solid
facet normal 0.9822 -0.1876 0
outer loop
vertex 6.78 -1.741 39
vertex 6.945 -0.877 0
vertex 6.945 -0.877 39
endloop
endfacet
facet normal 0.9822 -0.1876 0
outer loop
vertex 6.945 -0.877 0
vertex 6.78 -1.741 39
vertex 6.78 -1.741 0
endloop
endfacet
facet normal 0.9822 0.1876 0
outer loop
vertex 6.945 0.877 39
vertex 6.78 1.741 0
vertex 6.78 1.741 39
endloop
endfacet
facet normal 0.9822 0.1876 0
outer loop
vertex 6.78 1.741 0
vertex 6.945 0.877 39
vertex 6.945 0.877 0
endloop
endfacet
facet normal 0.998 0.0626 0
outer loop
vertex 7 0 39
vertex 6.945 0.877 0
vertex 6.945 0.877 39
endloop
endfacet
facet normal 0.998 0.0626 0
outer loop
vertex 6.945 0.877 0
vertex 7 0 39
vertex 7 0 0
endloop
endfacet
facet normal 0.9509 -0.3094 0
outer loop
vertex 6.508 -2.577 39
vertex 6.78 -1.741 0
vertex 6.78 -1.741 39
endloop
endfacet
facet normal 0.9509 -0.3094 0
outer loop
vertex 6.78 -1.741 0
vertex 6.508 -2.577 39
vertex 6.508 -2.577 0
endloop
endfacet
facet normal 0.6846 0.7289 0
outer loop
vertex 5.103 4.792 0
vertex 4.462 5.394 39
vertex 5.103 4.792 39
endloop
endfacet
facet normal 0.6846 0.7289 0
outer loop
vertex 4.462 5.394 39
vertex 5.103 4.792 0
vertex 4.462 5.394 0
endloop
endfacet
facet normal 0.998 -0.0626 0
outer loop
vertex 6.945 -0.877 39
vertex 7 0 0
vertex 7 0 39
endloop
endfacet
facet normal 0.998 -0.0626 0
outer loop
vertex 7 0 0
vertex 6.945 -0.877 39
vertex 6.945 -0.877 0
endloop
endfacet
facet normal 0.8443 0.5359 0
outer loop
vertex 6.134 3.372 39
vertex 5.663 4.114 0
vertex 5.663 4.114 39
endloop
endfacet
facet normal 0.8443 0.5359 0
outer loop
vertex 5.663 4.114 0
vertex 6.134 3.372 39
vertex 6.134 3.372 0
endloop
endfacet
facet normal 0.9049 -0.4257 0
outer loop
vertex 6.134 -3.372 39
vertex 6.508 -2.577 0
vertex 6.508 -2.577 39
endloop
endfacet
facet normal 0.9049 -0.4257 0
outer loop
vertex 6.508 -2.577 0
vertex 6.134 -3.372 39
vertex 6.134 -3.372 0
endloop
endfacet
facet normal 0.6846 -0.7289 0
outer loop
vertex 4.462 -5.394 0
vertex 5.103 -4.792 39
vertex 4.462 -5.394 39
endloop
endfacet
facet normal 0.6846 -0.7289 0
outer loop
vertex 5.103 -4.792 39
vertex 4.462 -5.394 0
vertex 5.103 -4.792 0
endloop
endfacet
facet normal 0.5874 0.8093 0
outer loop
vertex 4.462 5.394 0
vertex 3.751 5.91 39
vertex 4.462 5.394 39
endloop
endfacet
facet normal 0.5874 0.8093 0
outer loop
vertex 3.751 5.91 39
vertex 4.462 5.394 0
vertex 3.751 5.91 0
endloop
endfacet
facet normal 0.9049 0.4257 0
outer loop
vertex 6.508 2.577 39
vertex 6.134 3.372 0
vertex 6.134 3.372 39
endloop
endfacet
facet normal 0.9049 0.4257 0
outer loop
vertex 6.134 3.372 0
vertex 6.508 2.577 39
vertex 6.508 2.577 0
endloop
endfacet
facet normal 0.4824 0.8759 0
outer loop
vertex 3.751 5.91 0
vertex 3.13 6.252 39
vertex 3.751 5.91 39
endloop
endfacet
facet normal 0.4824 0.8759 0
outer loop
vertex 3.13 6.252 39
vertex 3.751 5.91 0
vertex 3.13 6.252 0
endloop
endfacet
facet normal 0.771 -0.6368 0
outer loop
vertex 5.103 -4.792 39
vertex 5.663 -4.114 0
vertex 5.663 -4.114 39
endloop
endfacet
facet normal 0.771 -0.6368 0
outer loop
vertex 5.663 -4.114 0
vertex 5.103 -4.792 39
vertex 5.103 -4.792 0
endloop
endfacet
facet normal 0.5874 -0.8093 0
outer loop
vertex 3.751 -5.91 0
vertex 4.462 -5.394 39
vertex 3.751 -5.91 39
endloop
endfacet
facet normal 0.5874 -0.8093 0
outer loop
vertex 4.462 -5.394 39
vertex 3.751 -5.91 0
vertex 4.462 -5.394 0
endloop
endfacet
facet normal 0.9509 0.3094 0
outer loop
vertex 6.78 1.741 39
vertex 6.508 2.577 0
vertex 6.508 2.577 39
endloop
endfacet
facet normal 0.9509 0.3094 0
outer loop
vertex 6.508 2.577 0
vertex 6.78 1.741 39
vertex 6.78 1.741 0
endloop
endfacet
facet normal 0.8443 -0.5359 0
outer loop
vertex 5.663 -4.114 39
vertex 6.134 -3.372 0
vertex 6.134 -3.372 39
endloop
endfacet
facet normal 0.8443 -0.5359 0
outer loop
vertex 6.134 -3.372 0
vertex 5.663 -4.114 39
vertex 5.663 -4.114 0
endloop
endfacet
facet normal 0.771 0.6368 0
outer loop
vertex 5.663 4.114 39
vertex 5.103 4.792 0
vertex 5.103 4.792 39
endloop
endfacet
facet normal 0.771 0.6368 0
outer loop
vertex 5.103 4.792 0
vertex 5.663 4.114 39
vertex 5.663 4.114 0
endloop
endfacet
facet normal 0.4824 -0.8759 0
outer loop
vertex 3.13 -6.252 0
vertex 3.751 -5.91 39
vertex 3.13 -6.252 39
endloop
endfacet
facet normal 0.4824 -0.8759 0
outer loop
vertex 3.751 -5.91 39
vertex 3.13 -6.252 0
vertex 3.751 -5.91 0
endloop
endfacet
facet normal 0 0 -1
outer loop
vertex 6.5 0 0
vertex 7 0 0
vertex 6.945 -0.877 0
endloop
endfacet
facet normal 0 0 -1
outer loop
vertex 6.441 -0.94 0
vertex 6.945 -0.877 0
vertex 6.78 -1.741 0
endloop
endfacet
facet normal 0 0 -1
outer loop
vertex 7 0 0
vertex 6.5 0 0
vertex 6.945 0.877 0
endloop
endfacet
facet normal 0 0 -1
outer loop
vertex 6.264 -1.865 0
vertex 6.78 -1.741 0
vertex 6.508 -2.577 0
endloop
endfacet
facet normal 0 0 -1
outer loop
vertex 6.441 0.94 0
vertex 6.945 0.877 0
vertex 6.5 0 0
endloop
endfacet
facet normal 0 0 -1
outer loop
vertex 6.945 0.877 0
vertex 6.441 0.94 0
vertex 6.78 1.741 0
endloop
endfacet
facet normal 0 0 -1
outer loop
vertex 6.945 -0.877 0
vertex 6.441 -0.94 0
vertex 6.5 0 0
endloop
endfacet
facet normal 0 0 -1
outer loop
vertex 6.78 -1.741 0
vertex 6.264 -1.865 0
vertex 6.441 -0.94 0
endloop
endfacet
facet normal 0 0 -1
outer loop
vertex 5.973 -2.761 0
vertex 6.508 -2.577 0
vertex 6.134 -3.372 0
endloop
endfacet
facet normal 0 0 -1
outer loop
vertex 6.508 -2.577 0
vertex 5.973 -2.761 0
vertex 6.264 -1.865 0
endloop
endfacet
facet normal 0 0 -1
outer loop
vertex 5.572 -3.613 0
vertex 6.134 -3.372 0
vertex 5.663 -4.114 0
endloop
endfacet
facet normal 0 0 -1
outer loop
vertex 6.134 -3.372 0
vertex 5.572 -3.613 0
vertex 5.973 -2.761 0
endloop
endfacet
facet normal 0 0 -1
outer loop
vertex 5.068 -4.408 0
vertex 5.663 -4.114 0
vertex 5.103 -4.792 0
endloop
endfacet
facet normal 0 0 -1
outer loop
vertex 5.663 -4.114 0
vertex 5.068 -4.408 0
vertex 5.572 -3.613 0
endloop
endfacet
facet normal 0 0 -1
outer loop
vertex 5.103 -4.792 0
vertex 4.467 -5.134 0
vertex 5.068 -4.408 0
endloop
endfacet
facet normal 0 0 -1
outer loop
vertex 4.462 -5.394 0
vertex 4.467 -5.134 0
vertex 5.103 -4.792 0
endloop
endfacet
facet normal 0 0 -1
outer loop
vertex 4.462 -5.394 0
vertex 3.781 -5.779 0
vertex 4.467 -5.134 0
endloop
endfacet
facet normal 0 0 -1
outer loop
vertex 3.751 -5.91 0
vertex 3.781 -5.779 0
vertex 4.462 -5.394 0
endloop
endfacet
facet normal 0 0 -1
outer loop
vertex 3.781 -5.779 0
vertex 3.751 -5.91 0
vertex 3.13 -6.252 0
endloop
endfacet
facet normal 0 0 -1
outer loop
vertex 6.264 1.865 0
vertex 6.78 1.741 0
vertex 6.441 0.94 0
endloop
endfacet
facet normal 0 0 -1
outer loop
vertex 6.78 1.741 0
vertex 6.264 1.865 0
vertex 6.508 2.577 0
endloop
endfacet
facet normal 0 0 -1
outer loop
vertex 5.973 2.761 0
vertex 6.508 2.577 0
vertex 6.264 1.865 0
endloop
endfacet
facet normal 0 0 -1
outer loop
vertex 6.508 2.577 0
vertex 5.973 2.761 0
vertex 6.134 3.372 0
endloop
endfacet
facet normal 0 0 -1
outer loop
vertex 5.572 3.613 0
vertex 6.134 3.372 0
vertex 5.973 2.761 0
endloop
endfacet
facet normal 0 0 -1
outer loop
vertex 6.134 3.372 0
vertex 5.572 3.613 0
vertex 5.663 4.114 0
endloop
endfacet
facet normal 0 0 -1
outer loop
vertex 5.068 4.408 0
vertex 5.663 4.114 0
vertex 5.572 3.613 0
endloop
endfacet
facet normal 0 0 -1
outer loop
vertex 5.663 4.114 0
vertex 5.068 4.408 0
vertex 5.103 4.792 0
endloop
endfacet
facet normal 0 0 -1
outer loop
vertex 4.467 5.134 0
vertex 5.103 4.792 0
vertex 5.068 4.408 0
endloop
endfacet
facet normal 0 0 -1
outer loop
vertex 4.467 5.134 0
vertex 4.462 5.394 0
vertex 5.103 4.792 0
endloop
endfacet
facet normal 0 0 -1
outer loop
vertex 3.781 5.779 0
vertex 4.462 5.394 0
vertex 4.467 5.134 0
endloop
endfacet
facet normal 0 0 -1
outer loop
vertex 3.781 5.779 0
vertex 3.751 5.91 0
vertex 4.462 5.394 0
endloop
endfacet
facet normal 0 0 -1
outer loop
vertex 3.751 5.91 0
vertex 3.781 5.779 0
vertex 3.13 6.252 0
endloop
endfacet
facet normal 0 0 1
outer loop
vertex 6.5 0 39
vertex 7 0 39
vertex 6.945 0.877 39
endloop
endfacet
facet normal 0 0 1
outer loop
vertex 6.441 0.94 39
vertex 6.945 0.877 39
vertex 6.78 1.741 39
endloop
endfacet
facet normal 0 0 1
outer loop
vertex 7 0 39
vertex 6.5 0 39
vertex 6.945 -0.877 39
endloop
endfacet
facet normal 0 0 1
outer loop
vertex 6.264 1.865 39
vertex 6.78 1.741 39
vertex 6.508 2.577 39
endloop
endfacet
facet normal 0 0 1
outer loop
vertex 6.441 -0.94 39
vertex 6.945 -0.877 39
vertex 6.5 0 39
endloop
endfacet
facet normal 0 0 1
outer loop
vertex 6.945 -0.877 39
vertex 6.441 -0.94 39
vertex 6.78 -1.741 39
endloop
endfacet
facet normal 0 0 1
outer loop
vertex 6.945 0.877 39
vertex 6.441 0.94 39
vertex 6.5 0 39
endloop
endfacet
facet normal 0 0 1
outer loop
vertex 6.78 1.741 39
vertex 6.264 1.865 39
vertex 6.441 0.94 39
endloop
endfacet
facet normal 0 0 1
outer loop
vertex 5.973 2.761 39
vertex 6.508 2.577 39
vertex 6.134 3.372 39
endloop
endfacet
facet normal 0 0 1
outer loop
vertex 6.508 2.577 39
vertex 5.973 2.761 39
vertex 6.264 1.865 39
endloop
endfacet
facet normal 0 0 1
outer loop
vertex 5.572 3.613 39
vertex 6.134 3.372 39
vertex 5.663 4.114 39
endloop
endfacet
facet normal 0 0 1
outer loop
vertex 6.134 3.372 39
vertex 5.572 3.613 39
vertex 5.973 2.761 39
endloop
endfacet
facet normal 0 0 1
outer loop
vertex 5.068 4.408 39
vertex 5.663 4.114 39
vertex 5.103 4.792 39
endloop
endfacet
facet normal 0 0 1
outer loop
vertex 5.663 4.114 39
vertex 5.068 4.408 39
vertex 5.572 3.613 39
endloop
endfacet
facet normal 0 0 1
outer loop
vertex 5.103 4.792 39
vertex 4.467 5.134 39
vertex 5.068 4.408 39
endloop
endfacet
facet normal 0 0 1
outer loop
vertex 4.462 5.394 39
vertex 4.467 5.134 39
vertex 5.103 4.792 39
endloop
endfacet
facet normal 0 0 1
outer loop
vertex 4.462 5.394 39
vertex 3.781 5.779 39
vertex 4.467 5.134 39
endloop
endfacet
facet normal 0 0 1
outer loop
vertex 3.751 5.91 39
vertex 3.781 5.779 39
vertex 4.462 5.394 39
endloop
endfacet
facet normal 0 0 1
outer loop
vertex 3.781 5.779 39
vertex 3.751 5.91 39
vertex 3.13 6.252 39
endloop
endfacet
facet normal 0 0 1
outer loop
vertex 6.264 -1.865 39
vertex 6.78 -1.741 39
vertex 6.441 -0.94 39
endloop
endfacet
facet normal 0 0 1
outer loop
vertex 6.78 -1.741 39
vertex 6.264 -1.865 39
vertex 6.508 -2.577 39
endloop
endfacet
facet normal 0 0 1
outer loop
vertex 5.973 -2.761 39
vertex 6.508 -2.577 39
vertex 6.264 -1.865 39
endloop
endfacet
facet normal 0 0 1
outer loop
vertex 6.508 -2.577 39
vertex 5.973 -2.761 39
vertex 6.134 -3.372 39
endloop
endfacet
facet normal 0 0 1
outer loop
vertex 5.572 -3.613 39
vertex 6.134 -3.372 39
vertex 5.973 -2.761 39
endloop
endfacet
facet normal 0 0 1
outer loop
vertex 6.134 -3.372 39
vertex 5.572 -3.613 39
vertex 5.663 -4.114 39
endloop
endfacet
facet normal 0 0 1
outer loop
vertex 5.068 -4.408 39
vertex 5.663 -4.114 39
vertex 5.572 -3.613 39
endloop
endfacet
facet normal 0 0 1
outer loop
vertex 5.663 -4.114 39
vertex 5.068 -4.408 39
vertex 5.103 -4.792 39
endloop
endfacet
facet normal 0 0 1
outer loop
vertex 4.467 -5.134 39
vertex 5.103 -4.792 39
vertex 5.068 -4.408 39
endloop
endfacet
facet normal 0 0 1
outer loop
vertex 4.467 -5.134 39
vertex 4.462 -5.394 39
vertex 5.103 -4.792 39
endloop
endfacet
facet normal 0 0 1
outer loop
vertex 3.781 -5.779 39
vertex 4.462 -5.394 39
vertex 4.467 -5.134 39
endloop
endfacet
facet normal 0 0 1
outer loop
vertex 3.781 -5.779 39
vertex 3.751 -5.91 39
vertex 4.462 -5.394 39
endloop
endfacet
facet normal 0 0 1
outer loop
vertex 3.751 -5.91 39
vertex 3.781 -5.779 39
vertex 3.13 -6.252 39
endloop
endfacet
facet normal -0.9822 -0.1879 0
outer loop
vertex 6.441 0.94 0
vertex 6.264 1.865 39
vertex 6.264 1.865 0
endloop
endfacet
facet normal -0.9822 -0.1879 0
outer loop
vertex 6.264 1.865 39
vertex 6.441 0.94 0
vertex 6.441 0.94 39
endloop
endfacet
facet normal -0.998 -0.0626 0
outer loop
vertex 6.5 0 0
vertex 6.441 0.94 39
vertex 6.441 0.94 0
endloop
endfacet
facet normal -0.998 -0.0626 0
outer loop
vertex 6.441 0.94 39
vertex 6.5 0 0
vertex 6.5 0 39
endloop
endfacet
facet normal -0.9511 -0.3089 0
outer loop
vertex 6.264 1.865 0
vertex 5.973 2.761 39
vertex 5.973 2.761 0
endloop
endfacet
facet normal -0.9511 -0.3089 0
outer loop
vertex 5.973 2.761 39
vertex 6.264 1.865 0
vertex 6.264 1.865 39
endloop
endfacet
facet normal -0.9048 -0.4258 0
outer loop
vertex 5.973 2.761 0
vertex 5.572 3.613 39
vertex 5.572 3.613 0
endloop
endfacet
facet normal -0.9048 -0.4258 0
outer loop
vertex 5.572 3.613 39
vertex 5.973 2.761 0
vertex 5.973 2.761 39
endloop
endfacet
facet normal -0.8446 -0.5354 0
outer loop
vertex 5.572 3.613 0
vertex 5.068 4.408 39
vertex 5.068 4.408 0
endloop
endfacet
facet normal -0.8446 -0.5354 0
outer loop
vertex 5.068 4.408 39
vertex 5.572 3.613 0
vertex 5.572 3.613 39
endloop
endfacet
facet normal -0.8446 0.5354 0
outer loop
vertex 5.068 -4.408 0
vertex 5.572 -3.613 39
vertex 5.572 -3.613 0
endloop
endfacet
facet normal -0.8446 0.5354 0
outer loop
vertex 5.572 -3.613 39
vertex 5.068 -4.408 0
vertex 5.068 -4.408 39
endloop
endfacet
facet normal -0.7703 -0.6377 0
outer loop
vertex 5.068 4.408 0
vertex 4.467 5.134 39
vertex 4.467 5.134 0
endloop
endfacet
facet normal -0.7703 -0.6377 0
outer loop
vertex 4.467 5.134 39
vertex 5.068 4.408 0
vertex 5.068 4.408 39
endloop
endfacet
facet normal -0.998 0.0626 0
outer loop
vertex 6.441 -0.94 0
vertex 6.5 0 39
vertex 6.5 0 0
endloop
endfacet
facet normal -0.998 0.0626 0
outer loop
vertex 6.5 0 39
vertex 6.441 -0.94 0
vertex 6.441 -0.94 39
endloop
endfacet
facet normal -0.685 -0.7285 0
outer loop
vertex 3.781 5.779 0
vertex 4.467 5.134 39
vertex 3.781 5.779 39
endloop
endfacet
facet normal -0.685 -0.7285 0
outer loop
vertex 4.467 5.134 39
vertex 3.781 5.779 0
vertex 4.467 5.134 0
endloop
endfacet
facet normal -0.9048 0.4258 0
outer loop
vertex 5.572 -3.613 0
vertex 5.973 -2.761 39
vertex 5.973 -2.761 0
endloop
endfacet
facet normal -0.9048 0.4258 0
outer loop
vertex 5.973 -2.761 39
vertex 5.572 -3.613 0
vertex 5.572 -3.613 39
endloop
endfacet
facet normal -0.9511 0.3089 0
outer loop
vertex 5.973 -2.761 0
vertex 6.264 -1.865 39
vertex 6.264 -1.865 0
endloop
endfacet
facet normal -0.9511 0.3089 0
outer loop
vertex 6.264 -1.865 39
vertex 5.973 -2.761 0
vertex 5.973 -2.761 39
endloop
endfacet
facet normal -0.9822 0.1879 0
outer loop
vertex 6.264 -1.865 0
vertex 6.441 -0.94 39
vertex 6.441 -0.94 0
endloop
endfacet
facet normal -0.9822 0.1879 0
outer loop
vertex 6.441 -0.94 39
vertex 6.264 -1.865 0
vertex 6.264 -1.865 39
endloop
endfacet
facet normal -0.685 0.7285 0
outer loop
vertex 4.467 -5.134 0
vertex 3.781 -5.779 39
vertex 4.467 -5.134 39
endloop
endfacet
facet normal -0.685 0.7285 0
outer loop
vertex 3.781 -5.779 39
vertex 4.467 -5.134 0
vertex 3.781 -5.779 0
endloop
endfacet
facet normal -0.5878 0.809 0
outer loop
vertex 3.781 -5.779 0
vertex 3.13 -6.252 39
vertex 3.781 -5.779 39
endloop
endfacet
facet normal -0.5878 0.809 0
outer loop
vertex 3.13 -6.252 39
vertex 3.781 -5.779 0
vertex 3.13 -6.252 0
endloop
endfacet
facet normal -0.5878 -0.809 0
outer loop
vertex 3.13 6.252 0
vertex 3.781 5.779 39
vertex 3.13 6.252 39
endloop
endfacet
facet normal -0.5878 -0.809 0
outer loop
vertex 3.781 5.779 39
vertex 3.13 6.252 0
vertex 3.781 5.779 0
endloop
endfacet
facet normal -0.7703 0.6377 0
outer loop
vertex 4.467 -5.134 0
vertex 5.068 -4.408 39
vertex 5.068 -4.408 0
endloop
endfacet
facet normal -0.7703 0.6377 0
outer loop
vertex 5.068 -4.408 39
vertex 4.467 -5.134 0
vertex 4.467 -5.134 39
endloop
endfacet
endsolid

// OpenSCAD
$fn = 50;


difference() {
	union() {
		cylinder(h = 39, r = 7.0000000000);
		translate(v = [-4.0000000000, 0, 0]) {
			cylinder(h = 39, r = 7.0000000000);
		}
	}
	union() {
		cylinder(h = 39, r = 3.2500000000);
		cylinder(h = 39, r = 1.8000000000);
		cylinder(h = 39, r = 1.8000000000);
		cylinder(h = 39, r = 1.8000000000);
		translate(v = [-8.5000000000, 0, 0]) {
			hull() {
				translate(v = [-3.7500000000, 0.0000000000, 0]) {
					cylinder(h = 39, r = 7.5000000000);
				}
				translate(v = [3.7500000000, 0.0000000000, 0]) {
					cylinder(h = 39, r = 7.5000000000);
				}
				translate(v = [-3.7500000000, -0.0000000000, 0]) {
					cylinder(h = 39, r = 7.5000000000);
				}
				translate(v = [3.7500000000, -0.0000000000, 0]) {
					cylinder(h = 39, r = 7.5000000000);
				}
			}
		}
		translate(v = [-1.0000000000, 0, 0.0000000000]) {
			cylinder(h = 39, r = 7.5000000000);
		}
	}
}
